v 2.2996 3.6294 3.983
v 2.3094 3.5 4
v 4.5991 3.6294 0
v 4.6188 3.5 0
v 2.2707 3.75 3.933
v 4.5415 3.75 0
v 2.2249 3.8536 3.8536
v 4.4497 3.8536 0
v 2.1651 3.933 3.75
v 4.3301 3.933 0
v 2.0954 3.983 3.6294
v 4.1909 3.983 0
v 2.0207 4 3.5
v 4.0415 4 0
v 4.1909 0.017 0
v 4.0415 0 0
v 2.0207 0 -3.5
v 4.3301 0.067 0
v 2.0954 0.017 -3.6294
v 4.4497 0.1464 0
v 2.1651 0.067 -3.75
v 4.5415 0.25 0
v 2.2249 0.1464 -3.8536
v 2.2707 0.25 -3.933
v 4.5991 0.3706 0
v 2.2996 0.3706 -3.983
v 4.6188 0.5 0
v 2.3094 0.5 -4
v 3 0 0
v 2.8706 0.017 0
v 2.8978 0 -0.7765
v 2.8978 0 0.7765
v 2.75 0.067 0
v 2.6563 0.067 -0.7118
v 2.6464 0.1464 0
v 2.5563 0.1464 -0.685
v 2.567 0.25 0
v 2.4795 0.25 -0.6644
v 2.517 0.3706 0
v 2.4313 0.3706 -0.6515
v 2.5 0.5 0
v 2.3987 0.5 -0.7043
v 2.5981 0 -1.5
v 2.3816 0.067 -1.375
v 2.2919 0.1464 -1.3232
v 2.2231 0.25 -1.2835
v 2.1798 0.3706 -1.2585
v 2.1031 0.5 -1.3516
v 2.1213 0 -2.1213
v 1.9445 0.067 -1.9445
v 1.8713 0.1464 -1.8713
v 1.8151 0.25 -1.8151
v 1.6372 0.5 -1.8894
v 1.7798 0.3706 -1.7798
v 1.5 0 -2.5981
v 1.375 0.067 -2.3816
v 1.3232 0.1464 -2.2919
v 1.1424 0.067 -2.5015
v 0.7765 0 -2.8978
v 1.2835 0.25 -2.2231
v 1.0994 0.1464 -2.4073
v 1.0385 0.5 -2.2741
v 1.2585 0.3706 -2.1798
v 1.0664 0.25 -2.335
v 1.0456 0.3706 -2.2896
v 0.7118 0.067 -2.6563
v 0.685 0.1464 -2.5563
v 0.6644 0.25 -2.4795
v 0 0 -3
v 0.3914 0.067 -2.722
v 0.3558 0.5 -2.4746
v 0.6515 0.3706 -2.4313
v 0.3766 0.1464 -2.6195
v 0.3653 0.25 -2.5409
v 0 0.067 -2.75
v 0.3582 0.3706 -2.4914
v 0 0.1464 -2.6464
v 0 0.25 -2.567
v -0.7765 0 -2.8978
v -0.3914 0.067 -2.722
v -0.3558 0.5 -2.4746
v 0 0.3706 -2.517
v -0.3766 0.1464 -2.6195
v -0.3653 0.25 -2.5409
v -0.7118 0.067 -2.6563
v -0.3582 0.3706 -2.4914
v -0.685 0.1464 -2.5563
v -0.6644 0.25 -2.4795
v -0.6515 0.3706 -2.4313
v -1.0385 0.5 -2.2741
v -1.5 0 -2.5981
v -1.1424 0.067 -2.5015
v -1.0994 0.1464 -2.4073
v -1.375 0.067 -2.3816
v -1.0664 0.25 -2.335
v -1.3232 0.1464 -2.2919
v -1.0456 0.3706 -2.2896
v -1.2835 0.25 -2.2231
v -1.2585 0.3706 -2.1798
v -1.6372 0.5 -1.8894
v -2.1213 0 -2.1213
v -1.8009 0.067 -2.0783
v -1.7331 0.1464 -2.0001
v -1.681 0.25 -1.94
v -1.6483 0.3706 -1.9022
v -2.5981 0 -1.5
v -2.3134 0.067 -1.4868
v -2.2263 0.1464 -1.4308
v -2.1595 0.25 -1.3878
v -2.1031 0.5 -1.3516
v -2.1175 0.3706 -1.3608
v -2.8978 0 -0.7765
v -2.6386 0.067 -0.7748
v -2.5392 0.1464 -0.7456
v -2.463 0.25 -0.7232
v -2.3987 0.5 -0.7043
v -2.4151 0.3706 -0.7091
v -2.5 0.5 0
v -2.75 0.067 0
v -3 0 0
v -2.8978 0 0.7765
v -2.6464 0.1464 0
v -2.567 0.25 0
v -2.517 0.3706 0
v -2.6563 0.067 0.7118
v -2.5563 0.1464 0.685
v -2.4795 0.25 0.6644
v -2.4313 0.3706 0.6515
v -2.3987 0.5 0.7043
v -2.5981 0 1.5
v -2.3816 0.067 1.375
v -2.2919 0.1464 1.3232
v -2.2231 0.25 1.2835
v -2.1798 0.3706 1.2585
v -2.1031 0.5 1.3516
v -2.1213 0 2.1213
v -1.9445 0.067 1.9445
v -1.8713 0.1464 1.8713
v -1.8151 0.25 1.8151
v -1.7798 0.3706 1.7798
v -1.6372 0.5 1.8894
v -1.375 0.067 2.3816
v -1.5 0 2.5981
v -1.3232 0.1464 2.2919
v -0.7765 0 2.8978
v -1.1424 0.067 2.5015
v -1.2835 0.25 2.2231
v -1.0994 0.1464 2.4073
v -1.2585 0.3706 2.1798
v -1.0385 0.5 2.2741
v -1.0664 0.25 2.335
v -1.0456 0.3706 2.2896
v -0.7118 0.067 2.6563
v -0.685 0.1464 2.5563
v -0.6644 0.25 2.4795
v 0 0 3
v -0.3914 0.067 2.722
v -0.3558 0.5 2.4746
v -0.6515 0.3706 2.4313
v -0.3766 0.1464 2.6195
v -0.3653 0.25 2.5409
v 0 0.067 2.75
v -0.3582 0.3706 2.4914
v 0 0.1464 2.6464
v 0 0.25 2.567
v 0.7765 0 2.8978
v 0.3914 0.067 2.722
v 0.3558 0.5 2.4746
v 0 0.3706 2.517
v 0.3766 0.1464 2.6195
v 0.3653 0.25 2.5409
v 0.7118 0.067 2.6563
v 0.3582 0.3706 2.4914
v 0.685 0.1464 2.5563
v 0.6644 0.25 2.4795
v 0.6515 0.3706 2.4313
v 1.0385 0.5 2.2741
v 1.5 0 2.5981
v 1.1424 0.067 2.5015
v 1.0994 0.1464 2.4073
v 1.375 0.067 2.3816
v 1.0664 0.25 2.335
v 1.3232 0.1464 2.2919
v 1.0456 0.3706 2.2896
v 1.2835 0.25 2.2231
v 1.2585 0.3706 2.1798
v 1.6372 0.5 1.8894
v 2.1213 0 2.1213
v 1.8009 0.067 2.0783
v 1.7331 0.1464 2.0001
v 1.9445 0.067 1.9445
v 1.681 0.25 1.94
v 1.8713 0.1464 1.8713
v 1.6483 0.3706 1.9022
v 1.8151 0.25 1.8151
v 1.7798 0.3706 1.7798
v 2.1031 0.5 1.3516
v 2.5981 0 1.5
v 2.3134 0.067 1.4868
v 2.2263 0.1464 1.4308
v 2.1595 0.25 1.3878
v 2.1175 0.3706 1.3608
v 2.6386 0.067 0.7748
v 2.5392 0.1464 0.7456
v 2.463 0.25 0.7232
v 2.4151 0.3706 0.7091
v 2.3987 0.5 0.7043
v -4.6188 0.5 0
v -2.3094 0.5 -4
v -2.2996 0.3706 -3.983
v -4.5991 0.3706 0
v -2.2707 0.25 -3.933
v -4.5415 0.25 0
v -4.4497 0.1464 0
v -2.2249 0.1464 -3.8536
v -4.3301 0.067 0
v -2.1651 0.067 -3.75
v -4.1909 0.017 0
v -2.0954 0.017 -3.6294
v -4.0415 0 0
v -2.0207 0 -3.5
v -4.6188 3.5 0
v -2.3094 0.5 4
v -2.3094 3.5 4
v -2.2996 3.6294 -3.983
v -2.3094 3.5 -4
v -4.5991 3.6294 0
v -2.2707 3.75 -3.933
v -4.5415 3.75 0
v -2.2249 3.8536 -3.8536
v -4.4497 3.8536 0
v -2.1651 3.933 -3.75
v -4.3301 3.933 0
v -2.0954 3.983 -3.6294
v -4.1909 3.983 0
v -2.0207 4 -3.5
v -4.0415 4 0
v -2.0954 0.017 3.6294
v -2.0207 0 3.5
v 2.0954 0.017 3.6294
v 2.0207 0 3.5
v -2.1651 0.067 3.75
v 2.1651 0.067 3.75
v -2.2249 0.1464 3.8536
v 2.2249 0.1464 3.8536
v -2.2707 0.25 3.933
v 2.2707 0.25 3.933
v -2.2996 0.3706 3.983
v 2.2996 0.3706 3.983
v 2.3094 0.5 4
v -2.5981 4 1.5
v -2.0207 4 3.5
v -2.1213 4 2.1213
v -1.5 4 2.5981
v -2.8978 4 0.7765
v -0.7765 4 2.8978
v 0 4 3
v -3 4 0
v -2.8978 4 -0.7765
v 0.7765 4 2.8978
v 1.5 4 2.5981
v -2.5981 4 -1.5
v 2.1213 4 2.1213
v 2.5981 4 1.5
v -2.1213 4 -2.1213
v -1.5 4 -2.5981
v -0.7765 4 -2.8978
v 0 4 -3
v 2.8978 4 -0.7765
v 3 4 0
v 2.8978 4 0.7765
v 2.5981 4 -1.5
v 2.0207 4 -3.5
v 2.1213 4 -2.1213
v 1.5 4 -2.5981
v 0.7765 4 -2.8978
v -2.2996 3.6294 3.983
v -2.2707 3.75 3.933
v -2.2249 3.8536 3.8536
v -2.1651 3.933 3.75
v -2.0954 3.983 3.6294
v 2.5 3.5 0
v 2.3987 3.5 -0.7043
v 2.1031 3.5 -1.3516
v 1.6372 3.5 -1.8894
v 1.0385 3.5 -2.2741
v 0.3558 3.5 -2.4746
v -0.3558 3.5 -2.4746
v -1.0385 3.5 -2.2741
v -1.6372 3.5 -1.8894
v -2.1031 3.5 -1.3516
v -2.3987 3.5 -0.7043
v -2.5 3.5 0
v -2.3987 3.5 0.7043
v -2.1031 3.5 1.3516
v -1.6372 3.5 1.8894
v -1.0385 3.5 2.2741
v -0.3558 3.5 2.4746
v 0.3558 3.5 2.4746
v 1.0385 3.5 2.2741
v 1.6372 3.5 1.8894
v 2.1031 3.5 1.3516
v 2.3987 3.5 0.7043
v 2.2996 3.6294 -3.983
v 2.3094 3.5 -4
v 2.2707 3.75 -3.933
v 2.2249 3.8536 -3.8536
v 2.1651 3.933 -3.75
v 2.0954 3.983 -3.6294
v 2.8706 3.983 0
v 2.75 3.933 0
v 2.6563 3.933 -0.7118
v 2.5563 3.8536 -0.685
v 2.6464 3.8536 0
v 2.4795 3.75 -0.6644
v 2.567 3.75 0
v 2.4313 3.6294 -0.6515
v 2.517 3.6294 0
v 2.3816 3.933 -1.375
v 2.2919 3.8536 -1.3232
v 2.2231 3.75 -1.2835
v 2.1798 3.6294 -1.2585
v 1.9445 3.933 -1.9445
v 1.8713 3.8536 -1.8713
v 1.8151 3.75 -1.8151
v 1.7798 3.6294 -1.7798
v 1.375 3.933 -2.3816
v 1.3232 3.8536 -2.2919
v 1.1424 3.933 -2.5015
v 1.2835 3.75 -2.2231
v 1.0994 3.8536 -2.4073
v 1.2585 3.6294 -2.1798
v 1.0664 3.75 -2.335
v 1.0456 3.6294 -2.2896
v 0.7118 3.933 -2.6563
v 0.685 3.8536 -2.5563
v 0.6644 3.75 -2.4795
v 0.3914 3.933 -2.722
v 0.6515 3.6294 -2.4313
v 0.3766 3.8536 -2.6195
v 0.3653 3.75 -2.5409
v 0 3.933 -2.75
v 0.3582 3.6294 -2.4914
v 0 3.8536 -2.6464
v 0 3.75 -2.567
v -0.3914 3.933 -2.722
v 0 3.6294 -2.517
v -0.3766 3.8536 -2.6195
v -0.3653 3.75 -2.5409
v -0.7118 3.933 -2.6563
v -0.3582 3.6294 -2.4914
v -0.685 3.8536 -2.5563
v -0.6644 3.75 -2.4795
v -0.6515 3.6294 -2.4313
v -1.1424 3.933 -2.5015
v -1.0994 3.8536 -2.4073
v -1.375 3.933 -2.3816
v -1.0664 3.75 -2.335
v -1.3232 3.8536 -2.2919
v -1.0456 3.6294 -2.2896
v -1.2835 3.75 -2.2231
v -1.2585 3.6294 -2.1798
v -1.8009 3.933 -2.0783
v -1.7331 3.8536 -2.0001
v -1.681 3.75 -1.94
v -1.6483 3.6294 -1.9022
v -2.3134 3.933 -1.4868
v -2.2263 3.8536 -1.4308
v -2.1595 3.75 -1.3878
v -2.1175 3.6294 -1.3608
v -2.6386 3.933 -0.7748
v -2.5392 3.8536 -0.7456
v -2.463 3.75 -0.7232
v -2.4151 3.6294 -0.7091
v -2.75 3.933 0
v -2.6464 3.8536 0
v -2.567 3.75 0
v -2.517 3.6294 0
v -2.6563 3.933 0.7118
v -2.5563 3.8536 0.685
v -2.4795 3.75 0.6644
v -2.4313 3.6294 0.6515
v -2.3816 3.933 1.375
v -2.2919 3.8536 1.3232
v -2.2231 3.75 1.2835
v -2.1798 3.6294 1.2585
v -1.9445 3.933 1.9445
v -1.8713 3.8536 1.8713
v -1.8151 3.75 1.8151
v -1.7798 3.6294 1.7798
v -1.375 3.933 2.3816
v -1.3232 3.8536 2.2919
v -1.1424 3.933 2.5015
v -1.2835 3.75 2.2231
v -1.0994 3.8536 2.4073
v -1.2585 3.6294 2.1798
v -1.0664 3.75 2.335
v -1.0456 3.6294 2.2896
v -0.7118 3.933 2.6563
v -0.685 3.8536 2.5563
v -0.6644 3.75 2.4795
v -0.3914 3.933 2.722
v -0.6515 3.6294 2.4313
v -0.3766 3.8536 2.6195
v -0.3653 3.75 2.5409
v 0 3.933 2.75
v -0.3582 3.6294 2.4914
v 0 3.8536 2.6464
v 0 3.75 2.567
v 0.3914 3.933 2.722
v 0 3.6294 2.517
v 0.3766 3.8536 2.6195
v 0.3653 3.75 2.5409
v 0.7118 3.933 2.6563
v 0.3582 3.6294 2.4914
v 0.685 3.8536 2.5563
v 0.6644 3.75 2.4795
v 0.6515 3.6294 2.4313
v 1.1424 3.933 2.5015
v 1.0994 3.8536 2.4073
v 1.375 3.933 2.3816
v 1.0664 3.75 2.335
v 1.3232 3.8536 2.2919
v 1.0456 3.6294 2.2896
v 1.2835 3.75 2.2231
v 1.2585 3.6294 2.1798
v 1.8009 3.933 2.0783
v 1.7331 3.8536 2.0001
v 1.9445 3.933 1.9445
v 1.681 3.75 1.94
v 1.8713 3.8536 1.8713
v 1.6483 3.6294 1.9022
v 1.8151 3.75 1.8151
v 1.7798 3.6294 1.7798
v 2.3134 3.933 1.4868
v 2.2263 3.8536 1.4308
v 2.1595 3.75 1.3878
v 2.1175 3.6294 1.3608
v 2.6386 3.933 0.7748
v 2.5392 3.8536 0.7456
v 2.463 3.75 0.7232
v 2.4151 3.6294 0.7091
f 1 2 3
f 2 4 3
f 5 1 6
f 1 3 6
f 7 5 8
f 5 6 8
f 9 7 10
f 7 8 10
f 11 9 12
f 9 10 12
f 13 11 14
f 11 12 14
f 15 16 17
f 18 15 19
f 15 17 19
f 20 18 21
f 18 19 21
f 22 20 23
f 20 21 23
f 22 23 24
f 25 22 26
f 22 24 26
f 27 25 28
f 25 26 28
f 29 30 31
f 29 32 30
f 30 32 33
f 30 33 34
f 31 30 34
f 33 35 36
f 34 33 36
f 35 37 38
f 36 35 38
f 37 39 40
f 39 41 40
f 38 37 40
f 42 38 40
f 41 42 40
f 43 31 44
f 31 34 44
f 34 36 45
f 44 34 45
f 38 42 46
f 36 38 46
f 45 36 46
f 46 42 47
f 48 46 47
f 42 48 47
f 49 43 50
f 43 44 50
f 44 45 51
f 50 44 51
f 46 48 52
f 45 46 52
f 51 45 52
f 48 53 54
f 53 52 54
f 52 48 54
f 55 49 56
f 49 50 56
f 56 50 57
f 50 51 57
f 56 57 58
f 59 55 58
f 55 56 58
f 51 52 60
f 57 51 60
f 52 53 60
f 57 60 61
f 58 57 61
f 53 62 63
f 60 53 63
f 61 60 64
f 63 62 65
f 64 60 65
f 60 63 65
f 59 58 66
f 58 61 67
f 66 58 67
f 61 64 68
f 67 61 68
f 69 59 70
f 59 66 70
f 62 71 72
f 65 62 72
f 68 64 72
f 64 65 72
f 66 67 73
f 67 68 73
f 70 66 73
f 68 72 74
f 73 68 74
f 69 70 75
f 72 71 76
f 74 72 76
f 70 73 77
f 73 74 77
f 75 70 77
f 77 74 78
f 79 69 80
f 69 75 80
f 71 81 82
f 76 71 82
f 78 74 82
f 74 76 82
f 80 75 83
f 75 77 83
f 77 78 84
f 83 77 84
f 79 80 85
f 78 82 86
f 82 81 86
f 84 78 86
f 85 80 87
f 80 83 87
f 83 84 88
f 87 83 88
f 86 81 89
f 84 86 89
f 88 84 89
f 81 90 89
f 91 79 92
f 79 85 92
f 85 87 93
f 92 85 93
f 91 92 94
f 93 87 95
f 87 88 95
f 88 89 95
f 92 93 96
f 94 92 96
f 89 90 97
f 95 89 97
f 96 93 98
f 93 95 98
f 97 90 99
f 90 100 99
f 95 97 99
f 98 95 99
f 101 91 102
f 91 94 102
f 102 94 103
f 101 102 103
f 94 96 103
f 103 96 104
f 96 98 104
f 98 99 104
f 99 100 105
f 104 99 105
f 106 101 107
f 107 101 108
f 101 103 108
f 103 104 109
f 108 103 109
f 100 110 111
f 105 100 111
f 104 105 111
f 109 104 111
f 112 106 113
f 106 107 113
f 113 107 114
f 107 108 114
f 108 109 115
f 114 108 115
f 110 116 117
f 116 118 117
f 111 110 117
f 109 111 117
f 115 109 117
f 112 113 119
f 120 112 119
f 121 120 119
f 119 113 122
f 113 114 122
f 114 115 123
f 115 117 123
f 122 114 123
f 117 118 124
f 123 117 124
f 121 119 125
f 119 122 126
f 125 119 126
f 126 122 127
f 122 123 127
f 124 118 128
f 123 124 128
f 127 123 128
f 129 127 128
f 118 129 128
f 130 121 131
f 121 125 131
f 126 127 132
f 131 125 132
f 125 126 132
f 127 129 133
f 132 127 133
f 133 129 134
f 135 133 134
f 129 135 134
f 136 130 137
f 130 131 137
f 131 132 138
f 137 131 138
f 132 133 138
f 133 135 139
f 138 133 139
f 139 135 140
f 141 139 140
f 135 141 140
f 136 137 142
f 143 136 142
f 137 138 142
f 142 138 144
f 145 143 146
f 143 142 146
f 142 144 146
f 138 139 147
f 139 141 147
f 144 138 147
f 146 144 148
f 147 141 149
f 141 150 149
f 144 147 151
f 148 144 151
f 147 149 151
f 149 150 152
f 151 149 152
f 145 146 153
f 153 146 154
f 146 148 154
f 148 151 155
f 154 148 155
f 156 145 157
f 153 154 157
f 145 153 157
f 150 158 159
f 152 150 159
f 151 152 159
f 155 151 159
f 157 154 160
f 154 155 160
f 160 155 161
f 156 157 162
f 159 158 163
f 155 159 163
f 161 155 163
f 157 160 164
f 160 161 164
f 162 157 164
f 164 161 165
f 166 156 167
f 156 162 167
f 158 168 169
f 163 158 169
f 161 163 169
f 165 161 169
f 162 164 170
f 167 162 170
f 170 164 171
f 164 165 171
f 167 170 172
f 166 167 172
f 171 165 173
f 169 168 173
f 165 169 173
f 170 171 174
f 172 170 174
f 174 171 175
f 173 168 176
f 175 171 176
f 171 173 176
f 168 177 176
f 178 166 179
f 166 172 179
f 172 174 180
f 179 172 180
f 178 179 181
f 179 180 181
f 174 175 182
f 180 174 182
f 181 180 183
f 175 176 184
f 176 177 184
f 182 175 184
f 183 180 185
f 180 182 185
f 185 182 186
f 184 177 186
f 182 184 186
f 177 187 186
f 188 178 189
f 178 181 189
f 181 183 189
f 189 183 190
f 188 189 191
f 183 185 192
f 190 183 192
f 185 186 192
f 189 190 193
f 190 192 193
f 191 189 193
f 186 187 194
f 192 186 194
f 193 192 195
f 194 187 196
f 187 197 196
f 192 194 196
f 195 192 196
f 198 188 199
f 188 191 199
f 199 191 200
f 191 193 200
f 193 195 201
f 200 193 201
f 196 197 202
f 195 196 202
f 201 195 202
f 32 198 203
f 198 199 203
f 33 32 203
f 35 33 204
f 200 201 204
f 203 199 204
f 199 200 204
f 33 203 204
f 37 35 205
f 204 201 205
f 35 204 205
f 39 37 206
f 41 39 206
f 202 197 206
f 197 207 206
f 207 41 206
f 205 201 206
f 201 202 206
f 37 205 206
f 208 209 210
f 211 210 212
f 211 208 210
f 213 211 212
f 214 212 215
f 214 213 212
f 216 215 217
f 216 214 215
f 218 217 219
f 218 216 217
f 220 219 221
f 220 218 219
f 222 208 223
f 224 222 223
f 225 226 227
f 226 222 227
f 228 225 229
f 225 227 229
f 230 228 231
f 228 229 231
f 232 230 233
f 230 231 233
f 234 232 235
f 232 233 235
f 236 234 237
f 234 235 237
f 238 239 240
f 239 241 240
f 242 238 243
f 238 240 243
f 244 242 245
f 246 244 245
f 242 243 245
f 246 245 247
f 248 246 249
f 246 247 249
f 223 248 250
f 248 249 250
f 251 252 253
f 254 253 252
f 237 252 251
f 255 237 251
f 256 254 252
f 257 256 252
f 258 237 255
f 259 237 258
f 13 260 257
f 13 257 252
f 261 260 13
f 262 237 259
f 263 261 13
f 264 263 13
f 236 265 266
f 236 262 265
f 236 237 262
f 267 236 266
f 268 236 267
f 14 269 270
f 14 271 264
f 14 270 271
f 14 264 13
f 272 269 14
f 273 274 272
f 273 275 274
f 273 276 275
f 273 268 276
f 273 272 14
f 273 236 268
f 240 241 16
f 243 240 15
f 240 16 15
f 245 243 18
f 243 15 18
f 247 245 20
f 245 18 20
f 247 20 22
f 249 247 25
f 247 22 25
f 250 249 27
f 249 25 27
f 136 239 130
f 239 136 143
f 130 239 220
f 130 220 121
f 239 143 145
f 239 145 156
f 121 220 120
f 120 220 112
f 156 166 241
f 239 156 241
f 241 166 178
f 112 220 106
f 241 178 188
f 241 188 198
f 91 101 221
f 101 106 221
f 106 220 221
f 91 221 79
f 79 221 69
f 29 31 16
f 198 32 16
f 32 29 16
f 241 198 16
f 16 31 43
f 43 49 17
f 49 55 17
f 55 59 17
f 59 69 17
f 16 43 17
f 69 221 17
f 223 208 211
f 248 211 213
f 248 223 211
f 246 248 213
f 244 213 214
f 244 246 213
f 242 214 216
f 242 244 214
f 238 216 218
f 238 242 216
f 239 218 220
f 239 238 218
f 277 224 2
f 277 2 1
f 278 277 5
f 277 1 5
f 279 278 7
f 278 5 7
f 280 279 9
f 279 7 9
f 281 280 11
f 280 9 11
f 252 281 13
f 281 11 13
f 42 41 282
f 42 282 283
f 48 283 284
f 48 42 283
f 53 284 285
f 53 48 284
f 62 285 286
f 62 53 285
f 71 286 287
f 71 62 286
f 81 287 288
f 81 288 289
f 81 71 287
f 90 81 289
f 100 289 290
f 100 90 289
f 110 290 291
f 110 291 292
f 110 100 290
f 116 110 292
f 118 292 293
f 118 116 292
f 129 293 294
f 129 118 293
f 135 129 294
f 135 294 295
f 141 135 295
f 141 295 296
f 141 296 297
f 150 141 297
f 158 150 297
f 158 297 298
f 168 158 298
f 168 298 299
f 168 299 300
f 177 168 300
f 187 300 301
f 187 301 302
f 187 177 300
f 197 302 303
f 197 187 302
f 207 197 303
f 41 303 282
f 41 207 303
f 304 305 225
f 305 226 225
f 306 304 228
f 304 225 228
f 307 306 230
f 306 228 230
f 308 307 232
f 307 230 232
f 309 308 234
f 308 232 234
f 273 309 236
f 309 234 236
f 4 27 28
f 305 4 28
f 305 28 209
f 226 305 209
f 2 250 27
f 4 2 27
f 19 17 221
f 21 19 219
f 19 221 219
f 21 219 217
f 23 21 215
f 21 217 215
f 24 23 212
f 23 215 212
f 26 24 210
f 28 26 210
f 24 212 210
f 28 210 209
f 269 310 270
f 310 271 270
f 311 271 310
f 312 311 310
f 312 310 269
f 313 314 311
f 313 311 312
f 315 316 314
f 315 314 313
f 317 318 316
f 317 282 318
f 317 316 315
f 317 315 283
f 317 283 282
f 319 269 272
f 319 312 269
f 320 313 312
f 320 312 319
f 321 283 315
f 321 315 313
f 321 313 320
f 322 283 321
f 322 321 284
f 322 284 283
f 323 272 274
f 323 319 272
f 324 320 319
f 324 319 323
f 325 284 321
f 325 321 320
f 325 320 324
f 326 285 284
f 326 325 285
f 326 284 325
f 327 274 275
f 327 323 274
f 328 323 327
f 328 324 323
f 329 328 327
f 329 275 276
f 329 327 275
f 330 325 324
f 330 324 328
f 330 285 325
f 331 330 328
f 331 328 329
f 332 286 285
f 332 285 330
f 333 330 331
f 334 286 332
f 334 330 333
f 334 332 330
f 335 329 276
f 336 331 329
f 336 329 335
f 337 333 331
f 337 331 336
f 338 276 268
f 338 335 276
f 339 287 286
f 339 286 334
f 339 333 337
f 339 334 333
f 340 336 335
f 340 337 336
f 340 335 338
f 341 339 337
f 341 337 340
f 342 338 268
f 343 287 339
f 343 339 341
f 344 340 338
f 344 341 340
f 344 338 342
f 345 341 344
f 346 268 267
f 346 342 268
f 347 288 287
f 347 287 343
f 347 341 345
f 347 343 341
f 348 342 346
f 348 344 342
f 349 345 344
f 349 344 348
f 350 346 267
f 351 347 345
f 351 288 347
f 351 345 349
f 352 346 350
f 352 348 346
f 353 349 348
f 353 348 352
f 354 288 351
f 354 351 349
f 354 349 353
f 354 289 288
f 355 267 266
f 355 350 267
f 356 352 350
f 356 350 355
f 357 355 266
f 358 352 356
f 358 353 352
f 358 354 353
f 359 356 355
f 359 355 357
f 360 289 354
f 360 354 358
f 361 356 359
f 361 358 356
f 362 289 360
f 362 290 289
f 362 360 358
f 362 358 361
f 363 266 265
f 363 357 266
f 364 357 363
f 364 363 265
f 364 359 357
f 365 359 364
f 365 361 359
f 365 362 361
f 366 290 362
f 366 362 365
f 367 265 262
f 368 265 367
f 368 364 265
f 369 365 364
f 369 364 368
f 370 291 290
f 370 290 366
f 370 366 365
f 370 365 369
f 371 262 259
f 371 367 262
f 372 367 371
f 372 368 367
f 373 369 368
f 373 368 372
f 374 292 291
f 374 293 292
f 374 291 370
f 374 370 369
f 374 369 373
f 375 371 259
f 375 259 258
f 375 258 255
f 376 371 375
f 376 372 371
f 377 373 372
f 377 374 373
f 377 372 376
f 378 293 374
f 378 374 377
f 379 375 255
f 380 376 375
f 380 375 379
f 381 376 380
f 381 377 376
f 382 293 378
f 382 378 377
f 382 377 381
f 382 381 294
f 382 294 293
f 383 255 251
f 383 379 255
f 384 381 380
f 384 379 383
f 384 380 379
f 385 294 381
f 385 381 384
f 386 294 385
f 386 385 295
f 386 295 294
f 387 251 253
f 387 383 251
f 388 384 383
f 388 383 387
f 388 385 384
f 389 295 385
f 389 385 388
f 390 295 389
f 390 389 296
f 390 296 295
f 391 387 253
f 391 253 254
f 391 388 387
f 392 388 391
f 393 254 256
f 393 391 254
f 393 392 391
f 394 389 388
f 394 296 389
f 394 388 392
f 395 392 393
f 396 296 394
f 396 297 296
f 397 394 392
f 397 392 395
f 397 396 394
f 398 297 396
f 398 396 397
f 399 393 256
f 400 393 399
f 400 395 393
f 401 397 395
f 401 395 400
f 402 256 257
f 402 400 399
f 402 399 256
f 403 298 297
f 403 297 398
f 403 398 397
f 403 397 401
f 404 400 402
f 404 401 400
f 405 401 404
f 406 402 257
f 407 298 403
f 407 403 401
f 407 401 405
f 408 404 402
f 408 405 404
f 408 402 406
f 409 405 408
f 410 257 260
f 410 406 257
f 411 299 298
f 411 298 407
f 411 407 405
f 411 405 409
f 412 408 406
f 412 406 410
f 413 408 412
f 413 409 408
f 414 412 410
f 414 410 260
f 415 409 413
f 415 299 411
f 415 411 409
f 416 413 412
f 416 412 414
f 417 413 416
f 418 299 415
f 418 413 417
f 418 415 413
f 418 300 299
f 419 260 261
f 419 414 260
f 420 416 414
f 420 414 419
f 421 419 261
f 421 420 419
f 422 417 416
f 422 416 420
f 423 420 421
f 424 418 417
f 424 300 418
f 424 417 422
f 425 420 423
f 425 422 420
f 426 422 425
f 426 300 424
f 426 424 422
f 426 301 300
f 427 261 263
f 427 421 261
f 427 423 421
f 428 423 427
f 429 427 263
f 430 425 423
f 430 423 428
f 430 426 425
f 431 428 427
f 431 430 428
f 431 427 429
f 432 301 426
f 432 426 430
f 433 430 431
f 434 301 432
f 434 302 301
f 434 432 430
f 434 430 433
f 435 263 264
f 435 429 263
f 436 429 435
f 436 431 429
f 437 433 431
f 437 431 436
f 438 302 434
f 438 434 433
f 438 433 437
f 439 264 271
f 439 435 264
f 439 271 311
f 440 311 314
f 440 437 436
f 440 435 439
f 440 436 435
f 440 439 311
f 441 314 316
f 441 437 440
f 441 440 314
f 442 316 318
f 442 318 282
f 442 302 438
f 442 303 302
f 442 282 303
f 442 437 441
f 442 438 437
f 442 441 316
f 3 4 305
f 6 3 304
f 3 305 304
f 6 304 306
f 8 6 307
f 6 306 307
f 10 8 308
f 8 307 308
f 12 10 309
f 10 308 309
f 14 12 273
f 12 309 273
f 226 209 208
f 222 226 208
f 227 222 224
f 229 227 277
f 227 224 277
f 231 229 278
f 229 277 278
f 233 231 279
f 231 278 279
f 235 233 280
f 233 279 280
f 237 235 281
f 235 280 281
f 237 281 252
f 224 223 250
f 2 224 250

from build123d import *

# Parameters (mm, degrees)
SKETCH1_R           = 2.5
BOSS_EXTRUDE1_DEPTH = 4
FILLET1_R           = 0.5
FILLET4_R           = 0.5
FILLET5_R           = 0.5


with BuildPart() as part:
    # Sketch1 → Boss-Extrude1 (new body)
    with BuildSketch(Plane(origin=(0, 0, 0), x_dir=(1, 0, 0), z_dir=(0, 1, 0))):
        Polygon((-4.618802154, 0), (-2.309401077, -4), (2.309401077, -4), (4.618802154, 0), (2.309401077, 4), (-2.309401077, 4), align=None)
        Circle(SKETCH1_R, mode=Mode.SUBTRACT)
    extrude(amount=BOSS_EXTRUDE1_DEPTH)

    # Fillet1
    fillet1_edges = [part.edges().sort_by_distance(p)[0] for p in [
        (0, 4, -4),
        (-3.464101615, 4, -2),
        (-3.464101615, 4, 2),
        (0, 4, 4),
        (3.464101615, 4, 2),
        (3.464101615, 4, -2),
    ]]
    fillet(fillet1_edges, radius=FILLET1_R)

    # Fillet4
    fillet4_edges = [part.edges().sort_by_distance(p)[0] for p in [
        (-2.5, 0, 0),
        (0, 0, 4),
        (-3.464101615, 0, 2),
        (-3.464101615, 0, -2),
        (0, 0, -4),
        (3.464101615, 0, -2),
        (3.464101615, 0, 2),
    ]]
    fillet(fillet4_edges, radius=FILLET4_R)

    # Fillet5
    fillet5_edges = [part.edges().sort_by_distance(p)[0] for p in [
        (-2.5, 4, 0),
    ]]
    fillet(fillet5_edges, radius=FILLET5_R)


solid = part.part
